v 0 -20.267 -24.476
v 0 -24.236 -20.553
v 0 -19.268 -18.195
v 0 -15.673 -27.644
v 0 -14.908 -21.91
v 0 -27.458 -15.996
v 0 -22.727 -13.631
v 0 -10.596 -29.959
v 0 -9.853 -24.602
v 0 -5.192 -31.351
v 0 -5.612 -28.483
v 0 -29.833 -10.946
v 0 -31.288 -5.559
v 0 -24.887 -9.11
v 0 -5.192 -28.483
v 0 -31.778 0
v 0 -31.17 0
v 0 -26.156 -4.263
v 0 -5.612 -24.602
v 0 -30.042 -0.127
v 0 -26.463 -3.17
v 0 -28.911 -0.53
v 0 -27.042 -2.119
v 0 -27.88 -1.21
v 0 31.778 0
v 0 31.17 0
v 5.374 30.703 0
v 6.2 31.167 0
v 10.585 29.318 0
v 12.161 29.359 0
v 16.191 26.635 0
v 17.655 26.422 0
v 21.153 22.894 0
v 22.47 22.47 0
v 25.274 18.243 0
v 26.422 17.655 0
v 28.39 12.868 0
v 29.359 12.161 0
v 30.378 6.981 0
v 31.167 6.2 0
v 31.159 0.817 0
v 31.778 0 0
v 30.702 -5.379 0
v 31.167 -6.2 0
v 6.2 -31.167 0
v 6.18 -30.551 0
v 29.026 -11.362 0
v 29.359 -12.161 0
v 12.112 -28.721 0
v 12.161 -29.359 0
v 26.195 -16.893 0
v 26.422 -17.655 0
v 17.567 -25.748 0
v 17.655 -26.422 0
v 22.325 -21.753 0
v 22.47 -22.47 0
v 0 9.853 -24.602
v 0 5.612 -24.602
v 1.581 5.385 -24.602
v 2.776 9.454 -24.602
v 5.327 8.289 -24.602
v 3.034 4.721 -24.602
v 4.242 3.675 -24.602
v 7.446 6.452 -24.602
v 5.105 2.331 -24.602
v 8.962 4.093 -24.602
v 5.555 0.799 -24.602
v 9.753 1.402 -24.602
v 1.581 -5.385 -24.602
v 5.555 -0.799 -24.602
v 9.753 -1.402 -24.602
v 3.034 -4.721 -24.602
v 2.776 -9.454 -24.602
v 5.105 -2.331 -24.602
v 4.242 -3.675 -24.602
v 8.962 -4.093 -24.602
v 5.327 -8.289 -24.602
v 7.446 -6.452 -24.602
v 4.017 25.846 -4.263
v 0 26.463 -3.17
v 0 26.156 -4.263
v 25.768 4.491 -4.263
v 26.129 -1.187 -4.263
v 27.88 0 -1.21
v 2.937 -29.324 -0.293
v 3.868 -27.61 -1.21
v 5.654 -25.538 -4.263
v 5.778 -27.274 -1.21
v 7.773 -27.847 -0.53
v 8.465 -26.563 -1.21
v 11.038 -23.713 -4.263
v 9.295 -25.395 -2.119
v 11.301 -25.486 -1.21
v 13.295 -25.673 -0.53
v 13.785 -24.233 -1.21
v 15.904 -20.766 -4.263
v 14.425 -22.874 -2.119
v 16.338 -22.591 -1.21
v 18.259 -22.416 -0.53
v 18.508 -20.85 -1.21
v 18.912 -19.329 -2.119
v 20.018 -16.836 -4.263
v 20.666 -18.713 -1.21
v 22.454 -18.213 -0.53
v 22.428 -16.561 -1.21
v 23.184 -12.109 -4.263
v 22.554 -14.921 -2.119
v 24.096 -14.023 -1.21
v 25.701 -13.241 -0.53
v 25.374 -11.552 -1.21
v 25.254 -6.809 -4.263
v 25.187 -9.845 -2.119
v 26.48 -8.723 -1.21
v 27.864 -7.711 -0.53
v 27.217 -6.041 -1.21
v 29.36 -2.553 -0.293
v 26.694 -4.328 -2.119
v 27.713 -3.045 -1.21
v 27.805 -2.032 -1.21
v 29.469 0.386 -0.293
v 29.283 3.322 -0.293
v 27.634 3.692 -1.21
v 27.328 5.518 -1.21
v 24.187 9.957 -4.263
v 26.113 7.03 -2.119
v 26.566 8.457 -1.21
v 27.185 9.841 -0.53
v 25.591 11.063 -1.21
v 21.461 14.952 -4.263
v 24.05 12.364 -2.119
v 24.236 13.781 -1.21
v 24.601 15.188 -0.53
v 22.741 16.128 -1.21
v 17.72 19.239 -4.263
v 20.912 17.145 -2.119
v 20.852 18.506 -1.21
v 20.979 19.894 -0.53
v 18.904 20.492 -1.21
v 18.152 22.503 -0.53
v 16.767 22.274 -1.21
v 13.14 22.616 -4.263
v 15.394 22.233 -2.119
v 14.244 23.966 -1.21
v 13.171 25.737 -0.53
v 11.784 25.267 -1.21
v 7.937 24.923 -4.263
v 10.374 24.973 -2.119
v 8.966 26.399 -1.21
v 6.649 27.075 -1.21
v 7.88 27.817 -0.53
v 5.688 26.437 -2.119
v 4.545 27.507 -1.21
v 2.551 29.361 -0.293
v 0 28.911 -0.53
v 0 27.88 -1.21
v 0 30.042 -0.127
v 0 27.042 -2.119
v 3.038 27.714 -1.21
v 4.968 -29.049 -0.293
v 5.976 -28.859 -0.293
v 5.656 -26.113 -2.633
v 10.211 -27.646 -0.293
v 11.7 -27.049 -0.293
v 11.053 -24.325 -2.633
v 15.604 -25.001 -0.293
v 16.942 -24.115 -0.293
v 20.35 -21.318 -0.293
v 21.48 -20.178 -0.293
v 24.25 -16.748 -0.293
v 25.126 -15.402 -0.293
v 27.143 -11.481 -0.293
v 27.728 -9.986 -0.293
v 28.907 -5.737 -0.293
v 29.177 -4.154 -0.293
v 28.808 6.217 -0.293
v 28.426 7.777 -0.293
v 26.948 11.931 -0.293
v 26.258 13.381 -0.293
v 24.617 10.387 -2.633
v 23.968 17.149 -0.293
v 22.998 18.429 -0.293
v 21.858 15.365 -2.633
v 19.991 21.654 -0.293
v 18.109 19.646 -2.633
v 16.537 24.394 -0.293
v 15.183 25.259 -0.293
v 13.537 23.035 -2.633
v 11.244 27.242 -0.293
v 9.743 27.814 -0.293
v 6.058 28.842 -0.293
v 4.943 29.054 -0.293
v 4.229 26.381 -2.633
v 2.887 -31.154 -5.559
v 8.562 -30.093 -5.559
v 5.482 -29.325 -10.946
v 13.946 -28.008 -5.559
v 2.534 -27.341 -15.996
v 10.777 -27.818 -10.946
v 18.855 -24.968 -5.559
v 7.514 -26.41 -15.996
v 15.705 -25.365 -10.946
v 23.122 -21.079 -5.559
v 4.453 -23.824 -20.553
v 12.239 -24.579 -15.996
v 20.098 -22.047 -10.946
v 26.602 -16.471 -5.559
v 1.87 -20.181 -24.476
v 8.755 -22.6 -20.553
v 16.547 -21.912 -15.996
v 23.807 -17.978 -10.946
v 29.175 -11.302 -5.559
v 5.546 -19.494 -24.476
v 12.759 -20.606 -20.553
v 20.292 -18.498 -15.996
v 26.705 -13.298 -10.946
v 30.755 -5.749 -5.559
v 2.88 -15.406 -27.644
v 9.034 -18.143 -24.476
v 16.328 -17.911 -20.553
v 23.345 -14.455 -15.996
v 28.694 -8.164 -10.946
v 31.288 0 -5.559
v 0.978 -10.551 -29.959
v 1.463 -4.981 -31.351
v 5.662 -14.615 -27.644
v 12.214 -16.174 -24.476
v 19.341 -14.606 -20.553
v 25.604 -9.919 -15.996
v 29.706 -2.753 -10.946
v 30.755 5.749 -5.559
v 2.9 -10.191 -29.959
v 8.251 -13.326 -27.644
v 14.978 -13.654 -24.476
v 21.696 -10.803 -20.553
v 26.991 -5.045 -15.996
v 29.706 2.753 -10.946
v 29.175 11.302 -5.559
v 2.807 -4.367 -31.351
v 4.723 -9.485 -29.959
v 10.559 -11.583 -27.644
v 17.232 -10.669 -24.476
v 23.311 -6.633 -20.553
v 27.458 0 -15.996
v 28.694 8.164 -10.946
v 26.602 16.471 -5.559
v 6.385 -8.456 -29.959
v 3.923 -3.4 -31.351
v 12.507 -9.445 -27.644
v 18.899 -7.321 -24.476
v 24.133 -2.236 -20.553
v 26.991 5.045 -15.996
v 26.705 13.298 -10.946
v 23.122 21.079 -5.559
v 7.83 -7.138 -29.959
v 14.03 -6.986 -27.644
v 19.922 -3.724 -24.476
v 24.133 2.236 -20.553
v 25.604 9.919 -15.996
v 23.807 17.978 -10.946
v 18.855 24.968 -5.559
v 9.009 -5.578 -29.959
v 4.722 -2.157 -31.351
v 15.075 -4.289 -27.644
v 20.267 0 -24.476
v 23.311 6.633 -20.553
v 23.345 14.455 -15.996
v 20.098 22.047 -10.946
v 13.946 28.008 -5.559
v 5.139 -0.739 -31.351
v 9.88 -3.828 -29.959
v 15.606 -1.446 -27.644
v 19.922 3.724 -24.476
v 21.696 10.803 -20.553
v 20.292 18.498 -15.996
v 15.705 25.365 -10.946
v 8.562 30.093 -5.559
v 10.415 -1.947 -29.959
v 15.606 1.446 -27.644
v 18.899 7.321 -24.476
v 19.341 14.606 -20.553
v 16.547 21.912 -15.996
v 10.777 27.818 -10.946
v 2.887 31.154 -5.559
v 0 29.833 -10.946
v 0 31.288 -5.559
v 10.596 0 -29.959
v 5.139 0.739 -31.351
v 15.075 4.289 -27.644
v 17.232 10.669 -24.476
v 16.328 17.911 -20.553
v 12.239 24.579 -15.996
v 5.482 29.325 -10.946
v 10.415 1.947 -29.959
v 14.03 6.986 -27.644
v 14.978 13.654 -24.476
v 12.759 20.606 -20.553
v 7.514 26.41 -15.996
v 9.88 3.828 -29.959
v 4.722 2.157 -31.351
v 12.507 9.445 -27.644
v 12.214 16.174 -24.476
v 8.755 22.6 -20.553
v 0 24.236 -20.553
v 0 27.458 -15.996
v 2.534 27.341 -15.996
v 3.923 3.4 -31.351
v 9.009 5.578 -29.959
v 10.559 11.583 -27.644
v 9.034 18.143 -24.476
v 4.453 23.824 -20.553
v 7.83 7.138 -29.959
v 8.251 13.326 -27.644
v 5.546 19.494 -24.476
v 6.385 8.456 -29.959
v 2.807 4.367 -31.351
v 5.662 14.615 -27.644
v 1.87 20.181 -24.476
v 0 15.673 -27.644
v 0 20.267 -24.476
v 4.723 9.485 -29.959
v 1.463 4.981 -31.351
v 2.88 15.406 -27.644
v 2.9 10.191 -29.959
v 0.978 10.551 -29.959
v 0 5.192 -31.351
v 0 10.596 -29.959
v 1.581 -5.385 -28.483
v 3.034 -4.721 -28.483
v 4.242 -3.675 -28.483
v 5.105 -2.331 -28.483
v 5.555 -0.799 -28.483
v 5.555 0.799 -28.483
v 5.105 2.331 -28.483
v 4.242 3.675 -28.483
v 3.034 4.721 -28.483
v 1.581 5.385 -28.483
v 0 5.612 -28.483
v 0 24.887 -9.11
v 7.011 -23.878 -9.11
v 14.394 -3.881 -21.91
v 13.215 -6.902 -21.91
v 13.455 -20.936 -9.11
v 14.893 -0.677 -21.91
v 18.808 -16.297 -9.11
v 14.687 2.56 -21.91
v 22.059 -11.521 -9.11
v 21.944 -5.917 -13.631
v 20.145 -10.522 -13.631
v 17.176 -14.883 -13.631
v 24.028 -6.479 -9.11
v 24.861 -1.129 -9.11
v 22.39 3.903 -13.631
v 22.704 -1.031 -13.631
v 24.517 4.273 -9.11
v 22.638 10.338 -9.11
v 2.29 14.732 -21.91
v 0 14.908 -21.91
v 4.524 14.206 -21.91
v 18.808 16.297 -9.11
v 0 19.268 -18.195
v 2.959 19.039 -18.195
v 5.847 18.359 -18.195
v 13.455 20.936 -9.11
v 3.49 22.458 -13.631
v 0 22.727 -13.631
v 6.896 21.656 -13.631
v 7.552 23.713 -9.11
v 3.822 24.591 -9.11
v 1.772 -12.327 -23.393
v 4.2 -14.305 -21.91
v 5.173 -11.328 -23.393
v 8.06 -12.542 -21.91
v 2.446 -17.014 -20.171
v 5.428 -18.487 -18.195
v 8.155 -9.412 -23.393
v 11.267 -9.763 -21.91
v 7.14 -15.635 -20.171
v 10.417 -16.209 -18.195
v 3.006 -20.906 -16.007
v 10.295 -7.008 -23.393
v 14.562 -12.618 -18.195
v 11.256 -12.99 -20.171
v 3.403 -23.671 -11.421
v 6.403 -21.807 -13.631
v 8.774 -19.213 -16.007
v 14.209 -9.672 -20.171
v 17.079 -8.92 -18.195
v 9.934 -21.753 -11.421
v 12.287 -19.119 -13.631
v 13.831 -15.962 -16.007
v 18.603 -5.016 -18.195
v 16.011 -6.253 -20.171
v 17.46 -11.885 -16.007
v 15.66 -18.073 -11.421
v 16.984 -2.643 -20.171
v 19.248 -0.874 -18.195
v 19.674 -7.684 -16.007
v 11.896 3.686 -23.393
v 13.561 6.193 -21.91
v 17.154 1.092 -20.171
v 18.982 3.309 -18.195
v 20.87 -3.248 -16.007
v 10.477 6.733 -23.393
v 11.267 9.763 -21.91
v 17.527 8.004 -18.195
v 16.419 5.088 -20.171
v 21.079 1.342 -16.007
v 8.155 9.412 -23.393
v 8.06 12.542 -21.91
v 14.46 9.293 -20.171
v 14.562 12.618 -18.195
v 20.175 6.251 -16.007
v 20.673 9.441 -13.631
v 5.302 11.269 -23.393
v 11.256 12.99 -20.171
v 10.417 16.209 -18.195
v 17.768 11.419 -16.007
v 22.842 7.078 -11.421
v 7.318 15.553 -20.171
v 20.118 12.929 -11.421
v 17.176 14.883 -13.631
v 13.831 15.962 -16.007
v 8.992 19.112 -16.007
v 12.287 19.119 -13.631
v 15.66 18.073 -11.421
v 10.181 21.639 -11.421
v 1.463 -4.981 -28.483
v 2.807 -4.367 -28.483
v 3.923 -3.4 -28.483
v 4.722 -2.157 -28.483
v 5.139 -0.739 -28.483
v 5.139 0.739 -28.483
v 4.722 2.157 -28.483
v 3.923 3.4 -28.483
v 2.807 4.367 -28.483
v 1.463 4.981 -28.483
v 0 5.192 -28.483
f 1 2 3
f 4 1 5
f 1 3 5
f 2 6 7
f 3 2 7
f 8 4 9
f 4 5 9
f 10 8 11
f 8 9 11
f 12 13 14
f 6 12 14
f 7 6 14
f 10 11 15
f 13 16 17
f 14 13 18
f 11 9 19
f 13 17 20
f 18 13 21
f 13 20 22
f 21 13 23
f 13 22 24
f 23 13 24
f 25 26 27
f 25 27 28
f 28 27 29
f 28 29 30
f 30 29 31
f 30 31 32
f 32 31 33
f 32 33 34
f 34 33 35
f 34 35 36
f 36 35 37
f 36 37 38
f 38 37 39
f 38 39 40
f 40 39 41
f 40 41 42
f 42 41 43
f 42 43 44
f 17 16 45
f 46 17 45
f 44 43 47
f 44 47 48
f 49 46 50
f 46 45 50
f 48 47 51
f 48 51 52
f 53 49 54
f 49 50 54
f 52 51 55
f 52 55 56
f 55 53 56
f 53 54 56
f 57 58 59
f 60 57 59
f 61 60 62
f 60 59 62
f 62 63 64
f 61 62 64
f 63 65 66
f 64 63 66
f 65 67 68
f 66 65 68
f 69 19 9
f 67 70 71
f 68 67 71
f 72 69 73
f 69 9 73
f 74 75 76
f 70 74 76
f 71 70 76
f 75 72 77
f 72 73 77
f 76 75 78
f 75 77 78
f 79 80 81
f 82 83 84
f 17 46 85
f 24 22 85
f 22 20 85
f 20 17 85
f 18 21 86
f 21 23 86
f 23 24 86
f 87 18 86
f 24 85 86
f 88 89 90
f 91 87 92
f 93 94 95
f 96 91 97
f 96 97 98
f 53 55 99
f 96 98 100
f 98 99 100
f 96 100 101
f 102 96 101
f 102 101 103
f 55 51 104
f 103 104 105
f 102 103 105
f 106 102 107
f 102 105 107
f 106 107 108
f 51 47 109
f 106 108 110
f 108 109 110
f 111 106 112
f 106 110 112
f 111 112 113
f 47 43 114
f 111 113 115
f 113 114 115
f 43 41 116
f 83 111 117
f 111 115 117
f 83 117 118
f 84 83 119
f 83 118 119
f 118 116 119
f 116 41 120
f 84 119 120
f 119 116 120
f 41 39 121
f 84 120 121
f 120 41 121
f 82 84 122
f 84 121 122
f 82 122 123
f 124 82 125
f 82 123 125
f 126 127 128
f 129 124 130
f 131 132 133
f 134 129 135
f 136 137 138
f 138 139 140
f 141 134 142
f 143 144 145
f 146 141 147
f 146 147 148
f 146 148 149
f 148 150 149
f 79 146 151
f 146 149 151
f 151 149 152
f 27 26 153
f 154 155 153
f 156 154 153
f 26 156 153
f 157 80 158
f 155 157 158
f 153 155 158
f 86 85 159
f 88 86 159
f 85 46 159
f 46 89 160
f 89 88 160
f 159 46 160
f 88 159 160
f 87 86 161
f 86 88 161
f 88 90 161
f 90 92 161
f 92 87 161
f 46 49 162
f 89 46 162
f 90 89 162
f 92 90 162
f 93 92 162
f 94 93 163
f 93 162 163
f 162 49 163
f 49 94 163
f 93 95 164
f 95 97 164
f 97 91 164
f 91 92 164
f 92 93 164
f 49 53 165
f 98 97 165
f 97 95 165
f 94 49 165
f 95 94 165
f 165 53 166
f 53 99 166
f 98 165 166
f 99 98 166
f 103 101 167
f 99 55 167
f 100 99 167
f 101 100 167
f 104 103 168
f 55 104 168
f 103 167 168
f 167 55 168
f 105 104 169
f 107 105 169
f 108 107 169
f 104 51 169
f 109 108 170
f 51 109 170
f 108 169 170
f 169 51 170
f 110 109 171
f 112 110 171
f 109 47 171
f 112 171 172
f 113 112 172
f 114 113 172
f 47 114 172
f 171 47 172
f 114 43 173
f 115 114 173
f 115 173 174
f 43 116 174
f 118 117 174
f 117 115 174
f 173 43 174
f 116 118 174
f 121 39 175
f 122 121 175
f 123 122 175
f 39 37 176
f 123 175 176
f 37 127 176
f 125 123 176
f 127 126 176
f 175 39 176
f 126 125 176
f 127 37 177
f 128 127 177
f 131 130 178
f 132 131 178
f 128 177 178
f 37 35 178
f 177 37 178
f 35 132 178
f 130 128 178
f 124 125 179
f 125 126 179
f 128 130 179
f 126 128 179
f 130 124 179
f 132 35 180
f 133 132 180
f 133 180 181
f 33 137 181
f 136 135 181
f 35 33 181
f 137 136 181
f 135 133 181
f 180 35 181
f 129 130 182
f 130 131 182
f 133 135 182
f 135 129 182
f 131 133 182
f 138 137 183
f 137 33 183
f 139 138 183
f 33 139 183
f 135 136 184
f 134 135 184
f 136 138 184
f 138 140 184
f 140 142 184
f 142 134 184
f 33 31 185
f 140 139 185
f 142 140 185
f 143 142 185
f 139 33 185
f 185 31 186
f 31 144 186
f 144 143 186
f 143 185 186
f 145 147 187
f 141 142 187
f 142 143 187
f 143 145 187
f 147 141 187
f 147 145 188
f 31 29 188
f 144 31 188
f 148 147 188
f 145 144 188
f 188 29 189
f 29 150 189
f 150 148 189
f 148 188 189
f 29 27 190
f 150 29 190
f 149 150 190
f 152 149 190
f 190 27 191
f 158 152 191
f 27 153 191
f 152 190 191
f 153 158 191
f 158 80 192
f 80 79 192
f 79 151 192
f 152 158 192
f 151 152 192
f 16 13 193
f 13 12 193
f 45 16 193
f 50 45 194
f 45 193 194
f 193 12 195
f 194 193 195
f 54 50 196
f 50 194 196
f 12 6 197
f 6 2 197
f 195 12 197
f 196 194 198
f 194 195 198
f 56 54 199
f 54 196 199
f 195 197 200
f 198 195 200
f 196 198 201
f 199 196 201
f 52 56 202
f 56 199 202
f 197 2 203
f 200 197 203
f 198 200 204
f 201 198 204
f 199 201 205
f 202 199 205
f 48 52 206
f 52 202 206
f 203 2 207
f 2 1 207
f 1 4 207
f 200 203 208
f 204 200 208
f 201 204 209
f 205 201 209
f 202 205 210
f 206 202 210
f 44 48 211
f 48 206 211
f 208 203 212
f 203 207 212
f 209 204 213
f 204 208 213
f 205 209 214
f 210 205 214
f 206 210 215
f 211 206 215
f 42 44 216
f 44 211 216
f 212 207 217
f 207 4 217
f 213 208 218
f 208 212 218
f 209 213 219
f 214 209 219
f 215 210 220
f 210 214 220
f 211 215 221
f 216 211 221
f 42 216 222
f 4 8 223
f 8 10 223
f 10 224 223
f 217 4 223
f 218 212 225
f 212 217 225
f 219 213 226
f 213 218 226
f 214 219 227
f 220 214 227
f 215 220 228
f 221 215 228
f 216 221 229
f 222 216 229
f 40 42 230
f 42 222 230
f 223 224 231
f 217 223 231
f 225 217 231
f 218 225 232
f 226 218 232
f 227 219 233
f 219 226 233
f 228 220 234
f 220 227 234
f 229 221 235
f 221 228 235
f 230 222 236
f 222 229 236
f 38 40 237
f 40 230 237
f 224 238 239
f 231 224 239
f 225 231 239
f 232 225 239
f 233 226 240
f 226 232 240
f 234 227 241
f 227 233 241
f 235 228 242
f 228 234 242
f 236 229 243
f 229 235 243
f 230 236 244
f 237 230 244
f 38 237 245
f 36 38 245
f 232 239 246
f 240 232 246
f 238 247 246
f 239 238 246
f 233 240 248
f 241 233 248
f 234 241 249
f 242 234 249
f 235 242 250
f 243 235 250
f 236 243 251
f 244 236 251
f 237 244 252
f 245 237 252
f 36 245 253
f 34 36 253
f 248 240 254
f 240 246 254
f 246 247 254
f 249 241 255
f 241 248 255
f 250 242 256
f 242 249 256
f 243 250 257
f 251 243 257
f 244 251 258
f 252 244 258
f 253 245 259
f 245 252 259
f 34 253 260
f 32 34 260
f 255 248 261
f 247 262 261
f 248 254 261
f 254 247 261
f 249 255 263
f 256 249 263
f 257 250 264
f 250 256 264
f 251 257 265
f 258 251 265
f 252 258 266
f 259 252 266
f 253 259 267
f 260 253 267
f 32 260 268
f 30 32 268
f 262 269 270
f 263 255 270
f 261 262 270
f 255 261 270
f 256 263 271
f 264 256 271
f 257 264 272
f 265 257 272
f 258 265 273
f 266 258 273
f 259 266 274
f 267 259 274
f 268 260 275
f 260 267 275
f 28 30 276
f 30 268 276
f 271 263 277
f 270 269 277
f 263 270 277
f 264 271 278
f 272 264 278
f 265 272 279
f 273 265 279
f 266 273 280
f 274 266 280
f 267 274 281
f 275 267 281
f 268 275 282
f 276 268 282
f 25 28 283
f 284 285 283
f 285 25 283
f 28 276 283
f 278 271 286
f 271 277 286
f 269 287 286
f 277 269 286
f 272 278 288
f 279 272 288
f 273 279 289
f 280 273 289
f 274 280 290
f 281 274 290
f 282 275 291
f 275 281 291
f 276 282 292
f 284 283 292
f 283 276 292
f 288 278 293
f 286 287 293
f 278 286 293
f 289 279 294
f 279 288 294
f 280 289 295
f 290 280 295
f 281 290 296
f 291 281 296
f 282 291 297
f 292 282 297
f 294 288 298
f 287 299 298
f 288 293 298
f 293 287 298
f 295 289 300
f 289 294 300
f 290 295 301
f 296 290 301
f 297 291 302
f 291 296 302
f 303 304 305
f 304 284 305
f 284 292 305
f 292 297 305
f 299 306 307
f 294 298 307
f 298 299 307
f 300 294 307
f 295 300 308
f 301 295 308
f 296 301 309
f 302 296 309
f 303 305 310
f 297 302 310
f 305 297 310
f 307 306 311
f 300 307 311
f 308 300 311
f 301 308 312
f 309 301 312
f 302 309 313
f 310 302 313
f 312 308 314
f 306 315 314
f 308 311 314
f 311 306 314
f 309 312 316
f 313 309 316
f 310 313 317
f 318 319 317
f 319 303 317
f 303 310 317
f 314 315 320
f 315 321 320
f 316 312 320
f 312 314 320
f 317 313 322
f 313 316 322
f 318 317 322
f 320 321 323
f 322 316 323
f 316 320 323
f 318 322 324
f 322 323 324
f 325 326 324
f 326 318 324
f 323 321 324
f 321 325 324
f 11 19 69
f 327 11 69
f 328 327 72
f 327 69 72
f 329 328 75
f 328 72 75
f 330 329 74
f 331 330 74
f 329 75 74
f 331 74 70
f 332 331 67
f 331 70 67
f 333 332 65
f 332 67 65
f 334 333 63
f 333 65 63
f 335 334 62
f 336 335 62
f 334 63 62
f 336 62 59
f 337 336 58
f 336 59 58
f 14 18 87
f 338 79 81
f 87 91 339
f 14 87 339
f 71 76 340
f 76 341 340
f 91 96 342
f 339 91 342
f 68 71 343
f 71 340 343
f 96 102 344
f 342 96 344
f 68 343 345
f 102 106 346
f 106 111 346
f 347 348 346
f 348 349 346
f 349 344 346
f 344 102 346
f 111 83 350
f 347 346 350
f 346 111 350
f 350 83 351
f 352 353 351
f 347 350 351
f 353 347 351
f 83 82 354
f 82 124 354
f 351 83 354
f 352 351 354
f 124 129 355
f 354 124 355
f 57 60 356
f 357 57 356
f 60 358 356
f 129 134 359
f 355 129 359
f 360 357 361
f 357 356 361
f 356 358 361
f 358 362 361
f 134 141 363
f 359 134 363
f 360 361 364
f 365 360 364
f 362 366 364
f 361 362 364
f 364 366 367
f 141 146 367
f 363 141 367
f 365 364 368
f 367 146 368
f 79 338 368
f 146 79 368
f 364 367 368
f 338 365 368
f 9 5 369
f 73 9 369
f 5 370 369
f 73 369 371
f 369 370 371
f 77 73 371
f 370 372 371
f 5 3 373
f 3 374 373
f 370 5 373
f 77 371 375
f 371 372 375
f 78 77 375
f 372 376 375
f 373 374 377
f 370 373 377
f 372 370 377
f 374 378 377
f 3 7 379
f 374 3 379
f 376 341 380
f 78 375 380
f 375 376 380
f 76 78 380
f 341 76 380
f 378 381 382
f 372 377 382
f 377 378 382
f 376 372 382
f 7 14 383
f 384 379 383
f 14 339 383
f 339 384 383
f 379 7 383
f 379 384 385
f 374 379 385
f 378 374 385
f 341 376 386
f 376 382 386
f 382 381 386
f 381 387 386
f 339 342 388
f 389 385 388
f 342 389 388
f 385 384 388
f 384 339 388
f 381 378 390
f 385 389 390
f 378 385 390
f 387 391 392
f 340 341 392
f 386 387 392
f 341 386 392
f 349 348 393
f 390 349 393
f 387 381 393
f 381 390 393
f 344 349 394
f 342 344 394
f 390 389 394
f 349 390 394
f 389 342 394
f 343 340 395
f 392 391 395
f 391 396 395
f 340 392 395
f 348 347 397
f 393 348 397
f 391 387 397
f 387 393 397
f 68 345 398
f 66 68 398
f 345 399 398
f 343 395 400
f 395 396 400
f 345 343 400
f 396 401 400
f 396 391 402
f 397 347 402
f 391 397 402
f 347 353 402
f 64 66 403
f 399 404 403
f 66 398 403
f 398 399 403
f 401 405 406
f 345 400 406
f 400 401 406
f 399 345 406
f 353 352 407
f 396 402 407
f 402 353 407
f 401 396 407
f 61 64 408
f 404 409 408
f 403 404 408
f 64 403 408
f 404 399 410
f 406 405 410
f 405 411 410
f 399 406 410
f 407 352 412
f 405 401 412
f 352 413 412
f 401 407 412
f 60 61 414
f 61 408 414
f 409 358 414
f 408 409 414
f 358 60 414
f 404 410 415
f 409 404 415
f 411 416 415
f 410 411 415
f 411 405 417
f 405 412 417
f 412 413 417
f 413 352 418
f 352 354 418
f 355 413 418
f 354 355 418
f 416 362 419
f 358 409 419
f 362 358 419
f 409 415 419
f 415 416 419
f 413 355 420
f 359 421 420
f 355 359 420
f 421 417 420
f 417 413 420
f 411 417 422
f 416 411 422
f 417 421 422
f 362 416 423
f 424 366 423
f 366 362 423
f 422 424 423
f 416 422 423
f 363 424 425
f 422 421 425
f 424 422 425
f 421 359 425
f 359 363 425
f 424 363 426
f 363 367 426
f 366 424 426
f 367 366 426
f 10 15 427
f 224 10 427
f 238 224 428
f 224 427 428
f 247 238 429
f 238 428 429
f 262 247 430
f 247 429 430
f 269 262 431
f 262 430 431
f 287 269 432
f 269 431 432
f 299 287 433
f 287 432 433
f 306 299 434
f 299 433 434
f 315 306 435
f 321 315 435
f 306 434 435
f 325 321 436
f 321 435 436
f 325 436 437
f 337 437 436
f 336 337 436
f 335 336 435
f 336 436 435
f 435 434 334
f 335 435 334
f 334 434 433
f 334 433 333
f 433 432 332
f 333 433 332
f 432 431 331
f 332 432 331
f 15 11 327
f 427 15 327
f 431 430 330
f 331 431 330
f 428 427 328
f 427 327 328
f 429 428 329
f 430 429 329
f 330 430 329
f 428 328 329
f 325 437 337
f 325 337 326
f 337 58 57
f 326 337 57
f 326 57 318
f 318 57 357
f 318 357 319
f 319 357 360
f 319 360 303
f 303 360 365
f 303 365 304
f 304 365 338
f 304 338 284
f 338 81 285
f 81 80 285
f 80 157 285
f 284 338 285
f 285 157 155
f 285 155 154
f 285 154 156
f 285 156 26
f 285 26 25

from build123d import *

# Parameters (mm, degrees)
F2_R     = 5.08
F3_W     = 75.227168
F3_H     = 48.306637
F4_DEPTH = 34.29


with BuildPart() as f1:
    # F0 (on Front) → F1 (revolve)
    with BuildSketch(Plane.XZ):
        with BuildLine():
            Line((-26.501408, 0), (-31.777891, 0))
            ThreePointArc((-31.777891, 0), (-24.236438, -20.553089), (-5.191517, -31.350958))
            Line((-5.191517, -31.350958), (-5.191517, -28.482988))
            Line((-5.191517, -28.482988), (-5.612337, -28.482988))
            Line((-5.612337, -28.482988), (-5.612337, -24.601767))
            Line((-5.612337, -24.601767), (-9.852801, -24.601767))
            ThreePointArc((-9.852801, -24.601767), (-21.948095, -14.852803), (-26.501408, 0))
        make_face()
    revolve(axis=Axis((0, 0, -28.432627), (0, 0, 1)))

    # F2
    f2_edges = [f1.edges().sort_by_distance(p)[0] for p in [
        (26.501408, 0, 0),
    ]]
    fillet(f2_edges, radius=F2_R)

    # F3 (on Right) → F4 (cut)
    with BuildSketch(Plane.YZ):
        with Locations((-0.6491, -24.153318)):
            Rectangle(F3_W, F3_H)
    extrude(amount=-F4_DEPTH, mode=Mode.SUBTRACT)


solid = f1.part
